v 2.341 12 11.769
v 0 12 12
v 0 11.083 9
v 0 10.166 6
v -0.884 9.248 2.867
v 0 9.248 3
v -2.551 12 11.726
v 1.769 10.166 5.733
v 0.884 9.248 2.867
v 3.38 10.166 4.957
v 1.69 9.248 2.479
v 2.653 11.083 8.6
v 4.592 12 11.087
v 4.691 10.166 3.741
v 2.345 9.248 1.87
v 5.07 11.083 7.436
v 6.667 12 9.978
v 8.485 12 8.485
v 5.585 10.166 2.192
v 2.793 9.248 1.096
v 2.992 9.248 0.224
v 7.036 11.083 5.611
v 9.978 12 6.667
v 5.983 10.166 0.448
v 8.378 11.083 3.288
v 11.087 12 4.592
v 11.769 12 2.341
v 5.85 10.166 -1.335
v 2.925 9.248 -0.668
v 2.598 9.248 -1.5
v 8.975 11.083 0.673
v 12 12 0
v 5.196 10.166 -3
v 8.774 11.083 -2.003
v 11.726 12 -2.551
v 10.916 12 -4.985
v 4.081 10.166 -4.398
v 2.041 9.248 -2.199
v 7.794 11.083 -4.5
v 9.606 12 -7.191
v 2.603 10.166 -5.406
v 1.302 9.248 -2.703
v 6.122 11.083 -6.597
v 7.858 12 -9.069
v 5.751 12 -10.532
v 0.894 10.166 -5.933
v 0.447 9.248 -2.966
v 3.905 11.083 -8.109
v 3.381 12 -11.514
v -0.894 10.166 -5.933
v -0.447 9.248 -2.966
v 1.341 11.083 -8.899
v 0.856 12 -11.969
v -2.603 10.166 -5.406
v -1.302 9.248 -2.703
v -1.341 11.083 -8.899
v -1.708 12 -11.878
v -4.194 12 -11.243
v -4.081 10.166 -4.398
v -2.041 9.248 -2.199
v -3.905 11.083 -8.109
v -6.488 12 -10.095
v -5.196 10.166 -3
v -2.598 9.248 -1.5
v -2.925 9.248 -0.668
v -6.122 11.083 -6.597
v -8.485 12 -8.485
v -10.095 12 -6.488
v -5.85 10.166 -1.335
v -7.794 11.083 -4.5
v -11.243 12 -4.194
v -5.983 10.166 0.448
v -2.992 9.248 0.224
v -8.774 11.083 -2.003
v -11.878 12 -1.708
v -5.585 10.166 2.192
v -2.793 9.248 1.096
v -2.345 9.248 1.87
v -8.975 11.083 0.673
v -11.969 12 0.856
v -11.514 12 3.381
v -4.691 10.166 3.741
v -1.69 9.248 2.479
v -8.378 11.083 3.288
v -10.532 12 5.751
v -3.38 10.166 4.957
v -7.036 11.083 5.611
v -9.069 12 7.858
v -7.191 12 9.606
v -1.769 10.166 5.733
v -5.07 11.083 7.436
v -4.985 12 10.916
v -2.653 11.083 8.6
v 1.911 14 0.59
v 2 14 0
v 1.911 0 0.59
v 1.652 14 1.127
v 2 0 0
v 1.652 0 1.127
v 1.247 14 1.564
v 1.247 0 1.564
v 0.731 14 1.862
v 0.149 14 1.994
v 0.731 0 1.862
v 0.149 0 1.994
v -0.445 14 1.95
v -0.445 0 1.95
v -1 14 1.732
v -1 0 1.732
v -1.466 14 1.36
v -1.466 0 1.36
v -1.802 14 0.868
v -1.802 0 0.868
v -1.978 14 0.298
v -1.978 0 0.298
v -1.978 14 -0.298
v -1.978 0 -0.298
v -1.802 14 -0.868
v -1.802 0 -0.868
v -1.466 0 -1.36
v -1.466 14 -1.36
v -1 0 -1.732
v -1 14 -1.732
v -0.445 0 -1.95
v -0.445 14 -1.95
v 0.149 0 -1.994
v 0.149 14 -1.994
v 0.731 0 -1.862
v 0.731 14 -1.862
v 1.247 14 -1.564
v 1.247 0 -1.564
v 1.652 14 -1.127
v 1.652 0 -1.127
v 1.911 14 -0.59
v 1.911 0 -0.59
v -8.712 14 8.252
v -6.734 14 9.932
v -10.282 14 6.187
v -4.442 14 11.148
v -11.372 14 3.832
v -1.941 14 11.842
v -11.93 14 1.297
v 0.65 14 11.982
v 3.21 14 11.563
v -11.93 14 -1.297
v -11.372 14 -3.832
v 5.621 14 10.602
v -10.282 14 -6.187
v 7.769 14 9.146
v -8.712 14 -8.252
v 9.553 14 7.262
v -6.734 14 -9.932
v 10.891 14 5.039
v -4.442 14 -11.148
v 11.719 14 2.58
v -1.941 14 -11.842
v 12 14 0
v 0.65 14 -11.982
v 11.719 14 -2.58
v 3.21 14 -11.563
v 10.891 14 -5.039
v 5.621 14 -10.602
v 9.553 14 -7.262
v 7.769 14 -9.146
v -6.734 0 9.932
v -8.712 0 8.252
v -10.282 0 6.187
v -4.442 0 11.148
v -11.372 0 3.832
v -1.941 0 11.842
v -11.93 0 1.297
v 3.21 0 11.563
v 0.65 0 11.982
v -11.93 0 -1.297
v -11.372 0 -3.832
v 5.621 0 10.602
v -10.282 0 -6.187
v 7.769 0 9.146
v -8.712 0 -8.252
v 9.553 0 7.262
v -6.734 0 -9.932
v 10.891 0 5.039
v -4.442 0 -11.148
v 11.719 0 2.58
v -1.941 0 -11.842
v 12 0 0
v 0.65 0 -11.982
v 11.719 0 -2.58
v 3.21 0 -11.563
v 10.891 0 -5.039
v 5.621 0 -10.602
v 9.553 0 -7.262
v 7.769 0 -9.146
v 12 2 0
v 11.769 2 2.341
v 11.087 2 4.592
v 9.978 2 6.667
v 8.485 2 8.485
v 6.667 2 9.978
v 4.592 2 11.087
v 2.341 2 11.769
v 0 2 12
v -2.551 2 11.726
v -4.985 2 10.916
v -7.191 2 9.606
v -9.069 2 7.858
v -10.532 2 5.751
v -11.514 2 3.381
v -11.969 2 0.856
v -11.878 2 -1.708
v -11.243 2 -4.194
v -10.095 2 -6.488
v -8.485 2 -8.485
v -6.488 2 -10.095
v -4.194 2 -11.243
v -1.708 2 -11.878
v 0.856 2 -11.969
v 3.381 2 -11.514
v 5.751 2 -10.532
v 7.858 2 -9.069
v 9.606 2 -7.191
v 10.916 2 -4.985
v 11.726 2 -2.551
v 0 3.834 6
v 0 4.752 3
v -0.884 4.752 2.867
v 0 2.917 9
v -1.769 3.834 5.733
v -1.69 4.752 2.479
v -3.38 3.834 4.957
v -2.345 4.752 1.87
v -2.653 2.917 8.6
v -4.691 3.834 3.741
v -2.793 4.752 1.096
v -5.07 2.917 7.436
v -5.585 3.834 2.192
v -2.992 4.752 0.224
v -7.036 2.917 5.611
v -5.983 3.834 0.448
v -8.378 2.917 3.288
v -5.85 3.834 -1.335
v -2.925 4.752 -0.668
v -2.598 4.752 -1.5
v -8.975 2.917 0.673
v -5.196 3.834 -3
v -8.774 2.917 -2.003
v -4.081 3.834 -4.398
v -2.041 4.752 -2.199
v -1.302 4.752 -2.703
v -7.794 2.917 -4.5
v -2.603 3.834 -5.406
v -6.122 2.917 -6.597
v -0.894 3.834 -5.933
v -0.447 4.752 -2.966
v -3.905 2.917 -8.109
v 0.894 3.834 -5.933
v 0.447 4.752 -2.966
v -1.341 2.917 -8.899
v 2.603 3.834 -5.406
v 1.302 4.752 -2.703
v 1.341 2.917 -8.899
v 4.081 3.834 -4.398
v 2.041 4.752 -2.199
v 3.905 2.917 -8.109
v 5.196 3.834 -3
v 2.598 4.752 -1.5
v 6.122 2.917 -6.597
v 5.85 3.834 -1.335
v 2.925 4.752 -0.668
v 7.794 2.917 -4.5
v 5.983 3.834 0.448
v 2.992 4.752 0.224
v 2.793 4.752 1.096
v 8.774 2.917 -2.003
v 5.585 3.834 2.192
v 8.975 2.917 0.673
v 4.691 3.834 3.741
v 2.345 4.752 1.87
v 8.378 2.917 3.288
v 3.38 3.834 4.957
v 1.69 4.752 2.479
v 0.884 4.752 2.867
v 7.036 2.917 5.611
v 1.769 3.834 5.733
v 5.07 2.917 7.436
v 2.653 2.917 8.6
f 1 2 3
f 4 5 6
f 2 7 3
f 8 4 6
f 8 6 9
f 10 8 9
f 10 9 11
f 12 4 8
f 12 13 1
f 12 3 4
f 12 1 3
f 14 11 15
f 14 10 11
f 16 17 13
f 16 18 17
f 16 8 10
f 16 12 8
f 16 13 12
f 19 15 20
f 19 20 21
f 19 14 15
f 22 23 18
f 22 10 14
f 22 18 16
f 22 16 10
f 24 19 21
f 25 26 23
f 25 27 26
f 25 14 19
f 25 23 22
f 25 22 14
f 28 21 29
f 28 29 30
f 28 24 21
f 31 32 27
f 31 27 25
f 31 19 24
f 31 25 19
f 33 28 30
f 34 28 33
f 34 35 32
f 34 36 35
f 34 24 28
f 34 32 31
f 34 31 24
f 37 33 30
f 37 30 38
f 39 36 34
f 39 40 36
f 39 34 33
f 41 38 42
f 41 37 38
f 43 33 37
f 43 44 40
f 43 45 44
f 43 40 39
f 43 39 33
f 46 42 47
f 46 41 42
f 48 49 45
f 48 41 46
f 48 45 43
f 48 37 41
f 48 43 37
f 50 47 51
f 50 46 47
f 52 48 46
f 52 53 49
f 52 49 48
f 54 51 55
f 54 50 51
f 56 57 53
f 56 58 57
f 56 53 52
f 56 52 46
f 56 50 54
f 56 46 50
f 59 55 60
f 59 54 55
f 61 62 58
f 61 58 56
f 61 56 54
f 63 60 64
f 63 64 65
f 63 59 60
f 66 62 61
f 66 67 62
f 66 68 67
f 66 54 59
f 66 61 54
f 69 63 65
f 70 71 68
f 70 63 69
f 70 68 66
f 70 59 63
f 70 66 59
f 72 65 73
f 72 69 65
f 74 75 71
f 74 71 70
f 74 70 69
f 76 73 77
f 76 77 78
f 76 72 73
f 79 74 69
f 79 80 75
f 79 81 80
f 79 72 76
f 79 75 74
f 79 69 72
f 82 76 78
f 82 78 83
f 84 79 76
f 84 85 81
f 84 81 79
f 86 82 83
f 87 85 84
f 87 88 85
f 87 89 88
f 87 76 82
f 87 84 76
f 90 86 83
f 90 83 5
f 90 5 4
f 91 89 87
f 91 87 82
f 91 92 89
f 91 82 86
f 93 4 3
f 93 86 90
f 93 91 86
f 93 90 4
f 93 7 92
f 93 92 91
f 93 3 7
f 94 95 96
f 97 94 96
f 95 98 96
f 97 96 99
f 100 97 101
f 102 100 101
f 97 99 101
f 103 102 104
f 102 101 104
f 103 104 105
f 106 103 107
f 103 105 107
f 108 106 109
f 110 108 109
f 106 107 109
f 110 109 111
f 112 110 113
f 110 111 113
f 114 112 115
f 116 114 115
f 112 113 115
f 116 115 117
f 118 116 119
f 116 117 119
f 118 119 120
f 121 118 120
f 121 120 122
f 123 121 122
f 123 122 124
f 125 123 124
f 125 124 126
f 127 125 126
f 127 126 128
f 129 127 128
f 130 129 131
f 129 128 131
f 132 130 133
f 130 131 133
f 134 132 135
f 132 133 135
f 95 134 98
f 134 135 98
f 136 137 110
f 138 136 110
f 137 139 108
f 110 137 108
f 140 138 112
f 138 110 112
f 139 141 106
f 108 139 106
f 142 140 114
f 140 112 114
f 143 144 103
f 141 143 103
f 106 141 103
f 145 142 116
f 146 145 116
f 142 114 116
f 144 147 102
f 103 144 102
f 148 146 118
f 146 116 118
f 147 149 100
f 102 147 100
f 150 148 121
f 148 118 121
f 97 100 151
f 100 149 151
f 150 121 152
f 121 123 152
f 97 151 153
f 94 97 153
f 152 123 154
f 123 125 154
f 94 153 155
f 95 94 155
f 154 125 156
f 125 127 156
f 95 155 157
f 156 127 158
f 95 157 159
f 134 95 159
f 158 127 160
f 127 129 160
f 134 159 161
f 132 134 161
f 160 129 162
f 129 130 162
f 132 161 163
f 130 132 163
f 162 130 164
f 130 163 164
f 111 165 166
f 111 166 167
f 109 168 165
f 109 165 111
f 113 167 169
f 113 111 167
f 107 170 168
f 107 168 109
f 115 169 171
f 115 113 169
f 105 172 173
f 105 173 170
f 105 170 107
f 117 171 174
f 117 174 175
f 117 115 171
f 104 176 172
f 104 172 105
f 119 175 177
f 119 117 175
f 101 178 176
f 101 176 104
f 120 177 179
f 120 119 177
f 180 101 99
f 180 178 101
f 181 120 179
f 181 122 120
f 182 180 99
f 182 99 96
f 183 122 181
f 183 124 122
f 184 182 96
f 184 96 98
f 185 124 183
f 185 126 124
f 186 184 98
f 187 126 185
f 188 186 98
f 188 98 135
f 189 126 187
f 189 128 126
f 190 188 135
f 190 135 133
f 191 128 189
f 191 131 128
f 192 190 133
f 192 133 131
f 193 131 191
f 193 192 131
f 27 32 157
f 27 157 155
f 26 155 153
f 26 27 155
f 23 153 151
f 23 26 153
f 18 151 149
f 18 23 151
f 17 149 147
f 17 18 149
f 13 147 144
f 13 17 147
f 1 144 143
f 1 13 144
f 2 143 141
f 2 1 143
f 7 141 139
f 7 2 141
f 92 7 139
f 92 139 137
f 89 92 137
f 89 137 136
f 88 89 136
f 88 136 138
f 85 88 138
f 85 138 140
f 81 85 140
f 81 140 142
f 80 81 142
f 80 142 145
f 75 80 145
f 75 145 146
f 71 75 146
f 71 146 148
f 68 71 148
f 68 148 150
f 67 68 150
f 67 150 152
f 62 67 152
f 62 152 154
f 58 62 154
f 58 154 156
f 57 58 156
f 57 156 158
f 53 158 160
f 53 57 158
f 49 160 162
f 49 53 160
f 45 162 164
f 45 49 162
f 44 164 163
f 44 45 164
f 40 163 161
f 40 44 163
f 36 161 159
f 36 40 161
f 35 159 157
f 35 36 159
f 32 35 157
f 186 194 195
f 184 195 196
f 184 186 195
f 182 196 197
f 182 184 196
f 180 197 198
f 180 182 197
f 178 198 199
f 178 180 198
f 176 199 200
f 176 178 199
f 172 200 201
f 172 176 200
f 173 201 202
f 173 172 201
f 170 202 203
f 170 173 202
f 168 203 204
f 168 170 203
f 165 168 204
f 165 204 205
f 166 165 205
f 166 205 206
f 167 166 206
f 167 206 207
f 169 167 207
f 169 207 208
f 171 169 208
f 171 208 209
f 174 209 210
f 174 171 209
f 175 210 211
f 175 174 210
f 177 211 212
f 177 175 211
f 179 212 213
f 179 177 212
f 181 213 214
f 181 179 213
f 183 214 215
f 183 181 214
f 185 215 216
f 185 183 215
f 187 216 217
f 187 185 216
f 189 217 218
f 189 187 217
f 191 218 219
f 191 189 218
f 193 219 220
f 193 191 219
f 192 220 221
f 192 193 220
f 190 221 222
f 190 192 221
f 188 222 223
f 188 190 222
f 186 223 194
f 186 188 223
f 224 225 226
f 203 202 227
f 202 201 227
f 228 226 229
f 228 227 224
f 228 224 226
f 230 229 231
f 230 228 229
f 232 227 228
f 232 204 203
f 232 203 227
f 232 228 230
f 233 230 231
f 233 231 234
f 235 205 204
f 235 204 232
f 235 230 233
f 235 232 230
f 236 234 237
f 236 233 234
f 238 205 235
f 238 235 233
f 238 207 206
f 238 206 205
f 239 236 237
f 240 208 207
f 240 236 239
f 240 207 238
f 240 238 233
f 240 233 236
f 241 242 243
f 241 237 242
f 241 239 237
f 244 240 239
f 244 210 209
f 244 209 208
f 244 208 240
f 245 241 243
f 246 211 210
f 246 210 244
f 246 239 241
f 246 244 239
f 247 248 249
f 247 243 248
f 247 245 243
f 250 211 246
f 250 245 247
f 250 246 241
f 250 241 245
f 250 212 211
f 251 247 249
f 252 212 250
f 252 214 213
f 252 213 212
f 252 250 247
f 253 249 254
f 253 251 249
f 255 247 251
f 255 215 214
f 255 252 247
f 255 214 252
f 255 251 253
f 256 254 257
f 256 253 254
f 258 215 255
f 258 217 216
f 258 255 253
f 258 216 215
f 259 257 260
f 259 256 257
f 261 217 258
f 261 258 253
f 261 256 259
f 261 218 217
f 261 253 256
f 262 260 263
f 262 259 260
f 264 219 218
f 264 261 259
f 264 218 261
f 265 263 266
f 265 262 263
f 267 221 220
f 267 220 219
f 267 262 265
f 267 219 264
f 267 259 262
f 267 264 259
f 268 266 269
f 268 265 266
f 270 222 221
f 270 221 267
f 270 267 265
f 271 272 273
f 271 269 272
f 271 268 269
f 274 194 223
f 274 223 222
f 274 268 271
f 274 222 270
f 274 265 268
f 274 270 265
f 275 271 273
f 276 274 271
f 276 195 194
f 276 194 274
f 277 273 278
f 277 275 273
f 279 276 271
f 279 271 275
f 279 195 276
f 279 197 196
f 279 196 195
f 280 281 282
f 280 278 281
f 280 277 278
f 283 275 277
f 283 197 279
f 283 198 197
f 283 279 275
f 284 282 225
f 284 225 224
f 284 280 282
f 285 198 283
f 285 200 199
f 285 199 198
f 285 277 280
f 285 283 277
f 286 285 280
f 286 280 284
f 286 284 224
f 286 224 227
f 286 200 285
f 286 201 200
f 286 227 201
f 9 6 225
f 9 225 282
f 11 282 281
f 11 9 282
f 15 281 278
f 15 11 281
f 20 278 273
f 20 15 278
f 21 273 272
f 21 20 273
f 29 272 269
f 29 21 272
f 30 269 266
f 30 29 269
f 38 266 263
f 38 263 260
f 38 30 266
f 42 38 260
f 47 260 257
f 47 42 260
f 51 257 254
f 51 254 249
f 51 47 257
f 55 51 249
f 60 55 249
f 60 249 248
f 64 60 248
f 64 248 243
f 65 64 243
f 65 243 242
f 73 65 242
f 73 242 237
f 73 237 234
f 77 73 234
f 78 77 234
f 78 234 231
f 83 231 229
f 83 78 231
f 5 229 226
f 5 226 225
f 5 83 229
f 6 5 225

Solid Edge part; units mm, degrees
sketch "Sketch1" plane through (0, 0, 0) normal (0, -1, 0) x (1, 0, 0)
  circle A0 centre (0, 0) radius 12
  dimension "D1" = 24
extrude "Protrusion1" add sketch "Sketch1" against normal blind 14
sketch "Sketch2" plane through (0, 0, 0) normal (0, -1, 0) x (1, 0, 0)
  circle A0 centre (0, 0) radius 2
  dimension "D1" = 4
extrude "Cutout1" cut sketch "Sketch2" against normal up to next
sketch "Sketch3" plane through (0, 0, 0) normal (1, 0, 0) x (0, 1, 0)
  line L0 (2, 12) -> (4.7516, 3)
  line L1 (4.7516, 3) -> (9.2484, 3)
  line L2 (9.2484, 3) -> (12, 12)
  line L3 (12, 12) -> (2, 12)
revolve "RevolvedCutout1" cut sketch "Sketch3" angle 360 about axis through (0, 0, 0) along (0, 1, 0)
properties material "Steel"
